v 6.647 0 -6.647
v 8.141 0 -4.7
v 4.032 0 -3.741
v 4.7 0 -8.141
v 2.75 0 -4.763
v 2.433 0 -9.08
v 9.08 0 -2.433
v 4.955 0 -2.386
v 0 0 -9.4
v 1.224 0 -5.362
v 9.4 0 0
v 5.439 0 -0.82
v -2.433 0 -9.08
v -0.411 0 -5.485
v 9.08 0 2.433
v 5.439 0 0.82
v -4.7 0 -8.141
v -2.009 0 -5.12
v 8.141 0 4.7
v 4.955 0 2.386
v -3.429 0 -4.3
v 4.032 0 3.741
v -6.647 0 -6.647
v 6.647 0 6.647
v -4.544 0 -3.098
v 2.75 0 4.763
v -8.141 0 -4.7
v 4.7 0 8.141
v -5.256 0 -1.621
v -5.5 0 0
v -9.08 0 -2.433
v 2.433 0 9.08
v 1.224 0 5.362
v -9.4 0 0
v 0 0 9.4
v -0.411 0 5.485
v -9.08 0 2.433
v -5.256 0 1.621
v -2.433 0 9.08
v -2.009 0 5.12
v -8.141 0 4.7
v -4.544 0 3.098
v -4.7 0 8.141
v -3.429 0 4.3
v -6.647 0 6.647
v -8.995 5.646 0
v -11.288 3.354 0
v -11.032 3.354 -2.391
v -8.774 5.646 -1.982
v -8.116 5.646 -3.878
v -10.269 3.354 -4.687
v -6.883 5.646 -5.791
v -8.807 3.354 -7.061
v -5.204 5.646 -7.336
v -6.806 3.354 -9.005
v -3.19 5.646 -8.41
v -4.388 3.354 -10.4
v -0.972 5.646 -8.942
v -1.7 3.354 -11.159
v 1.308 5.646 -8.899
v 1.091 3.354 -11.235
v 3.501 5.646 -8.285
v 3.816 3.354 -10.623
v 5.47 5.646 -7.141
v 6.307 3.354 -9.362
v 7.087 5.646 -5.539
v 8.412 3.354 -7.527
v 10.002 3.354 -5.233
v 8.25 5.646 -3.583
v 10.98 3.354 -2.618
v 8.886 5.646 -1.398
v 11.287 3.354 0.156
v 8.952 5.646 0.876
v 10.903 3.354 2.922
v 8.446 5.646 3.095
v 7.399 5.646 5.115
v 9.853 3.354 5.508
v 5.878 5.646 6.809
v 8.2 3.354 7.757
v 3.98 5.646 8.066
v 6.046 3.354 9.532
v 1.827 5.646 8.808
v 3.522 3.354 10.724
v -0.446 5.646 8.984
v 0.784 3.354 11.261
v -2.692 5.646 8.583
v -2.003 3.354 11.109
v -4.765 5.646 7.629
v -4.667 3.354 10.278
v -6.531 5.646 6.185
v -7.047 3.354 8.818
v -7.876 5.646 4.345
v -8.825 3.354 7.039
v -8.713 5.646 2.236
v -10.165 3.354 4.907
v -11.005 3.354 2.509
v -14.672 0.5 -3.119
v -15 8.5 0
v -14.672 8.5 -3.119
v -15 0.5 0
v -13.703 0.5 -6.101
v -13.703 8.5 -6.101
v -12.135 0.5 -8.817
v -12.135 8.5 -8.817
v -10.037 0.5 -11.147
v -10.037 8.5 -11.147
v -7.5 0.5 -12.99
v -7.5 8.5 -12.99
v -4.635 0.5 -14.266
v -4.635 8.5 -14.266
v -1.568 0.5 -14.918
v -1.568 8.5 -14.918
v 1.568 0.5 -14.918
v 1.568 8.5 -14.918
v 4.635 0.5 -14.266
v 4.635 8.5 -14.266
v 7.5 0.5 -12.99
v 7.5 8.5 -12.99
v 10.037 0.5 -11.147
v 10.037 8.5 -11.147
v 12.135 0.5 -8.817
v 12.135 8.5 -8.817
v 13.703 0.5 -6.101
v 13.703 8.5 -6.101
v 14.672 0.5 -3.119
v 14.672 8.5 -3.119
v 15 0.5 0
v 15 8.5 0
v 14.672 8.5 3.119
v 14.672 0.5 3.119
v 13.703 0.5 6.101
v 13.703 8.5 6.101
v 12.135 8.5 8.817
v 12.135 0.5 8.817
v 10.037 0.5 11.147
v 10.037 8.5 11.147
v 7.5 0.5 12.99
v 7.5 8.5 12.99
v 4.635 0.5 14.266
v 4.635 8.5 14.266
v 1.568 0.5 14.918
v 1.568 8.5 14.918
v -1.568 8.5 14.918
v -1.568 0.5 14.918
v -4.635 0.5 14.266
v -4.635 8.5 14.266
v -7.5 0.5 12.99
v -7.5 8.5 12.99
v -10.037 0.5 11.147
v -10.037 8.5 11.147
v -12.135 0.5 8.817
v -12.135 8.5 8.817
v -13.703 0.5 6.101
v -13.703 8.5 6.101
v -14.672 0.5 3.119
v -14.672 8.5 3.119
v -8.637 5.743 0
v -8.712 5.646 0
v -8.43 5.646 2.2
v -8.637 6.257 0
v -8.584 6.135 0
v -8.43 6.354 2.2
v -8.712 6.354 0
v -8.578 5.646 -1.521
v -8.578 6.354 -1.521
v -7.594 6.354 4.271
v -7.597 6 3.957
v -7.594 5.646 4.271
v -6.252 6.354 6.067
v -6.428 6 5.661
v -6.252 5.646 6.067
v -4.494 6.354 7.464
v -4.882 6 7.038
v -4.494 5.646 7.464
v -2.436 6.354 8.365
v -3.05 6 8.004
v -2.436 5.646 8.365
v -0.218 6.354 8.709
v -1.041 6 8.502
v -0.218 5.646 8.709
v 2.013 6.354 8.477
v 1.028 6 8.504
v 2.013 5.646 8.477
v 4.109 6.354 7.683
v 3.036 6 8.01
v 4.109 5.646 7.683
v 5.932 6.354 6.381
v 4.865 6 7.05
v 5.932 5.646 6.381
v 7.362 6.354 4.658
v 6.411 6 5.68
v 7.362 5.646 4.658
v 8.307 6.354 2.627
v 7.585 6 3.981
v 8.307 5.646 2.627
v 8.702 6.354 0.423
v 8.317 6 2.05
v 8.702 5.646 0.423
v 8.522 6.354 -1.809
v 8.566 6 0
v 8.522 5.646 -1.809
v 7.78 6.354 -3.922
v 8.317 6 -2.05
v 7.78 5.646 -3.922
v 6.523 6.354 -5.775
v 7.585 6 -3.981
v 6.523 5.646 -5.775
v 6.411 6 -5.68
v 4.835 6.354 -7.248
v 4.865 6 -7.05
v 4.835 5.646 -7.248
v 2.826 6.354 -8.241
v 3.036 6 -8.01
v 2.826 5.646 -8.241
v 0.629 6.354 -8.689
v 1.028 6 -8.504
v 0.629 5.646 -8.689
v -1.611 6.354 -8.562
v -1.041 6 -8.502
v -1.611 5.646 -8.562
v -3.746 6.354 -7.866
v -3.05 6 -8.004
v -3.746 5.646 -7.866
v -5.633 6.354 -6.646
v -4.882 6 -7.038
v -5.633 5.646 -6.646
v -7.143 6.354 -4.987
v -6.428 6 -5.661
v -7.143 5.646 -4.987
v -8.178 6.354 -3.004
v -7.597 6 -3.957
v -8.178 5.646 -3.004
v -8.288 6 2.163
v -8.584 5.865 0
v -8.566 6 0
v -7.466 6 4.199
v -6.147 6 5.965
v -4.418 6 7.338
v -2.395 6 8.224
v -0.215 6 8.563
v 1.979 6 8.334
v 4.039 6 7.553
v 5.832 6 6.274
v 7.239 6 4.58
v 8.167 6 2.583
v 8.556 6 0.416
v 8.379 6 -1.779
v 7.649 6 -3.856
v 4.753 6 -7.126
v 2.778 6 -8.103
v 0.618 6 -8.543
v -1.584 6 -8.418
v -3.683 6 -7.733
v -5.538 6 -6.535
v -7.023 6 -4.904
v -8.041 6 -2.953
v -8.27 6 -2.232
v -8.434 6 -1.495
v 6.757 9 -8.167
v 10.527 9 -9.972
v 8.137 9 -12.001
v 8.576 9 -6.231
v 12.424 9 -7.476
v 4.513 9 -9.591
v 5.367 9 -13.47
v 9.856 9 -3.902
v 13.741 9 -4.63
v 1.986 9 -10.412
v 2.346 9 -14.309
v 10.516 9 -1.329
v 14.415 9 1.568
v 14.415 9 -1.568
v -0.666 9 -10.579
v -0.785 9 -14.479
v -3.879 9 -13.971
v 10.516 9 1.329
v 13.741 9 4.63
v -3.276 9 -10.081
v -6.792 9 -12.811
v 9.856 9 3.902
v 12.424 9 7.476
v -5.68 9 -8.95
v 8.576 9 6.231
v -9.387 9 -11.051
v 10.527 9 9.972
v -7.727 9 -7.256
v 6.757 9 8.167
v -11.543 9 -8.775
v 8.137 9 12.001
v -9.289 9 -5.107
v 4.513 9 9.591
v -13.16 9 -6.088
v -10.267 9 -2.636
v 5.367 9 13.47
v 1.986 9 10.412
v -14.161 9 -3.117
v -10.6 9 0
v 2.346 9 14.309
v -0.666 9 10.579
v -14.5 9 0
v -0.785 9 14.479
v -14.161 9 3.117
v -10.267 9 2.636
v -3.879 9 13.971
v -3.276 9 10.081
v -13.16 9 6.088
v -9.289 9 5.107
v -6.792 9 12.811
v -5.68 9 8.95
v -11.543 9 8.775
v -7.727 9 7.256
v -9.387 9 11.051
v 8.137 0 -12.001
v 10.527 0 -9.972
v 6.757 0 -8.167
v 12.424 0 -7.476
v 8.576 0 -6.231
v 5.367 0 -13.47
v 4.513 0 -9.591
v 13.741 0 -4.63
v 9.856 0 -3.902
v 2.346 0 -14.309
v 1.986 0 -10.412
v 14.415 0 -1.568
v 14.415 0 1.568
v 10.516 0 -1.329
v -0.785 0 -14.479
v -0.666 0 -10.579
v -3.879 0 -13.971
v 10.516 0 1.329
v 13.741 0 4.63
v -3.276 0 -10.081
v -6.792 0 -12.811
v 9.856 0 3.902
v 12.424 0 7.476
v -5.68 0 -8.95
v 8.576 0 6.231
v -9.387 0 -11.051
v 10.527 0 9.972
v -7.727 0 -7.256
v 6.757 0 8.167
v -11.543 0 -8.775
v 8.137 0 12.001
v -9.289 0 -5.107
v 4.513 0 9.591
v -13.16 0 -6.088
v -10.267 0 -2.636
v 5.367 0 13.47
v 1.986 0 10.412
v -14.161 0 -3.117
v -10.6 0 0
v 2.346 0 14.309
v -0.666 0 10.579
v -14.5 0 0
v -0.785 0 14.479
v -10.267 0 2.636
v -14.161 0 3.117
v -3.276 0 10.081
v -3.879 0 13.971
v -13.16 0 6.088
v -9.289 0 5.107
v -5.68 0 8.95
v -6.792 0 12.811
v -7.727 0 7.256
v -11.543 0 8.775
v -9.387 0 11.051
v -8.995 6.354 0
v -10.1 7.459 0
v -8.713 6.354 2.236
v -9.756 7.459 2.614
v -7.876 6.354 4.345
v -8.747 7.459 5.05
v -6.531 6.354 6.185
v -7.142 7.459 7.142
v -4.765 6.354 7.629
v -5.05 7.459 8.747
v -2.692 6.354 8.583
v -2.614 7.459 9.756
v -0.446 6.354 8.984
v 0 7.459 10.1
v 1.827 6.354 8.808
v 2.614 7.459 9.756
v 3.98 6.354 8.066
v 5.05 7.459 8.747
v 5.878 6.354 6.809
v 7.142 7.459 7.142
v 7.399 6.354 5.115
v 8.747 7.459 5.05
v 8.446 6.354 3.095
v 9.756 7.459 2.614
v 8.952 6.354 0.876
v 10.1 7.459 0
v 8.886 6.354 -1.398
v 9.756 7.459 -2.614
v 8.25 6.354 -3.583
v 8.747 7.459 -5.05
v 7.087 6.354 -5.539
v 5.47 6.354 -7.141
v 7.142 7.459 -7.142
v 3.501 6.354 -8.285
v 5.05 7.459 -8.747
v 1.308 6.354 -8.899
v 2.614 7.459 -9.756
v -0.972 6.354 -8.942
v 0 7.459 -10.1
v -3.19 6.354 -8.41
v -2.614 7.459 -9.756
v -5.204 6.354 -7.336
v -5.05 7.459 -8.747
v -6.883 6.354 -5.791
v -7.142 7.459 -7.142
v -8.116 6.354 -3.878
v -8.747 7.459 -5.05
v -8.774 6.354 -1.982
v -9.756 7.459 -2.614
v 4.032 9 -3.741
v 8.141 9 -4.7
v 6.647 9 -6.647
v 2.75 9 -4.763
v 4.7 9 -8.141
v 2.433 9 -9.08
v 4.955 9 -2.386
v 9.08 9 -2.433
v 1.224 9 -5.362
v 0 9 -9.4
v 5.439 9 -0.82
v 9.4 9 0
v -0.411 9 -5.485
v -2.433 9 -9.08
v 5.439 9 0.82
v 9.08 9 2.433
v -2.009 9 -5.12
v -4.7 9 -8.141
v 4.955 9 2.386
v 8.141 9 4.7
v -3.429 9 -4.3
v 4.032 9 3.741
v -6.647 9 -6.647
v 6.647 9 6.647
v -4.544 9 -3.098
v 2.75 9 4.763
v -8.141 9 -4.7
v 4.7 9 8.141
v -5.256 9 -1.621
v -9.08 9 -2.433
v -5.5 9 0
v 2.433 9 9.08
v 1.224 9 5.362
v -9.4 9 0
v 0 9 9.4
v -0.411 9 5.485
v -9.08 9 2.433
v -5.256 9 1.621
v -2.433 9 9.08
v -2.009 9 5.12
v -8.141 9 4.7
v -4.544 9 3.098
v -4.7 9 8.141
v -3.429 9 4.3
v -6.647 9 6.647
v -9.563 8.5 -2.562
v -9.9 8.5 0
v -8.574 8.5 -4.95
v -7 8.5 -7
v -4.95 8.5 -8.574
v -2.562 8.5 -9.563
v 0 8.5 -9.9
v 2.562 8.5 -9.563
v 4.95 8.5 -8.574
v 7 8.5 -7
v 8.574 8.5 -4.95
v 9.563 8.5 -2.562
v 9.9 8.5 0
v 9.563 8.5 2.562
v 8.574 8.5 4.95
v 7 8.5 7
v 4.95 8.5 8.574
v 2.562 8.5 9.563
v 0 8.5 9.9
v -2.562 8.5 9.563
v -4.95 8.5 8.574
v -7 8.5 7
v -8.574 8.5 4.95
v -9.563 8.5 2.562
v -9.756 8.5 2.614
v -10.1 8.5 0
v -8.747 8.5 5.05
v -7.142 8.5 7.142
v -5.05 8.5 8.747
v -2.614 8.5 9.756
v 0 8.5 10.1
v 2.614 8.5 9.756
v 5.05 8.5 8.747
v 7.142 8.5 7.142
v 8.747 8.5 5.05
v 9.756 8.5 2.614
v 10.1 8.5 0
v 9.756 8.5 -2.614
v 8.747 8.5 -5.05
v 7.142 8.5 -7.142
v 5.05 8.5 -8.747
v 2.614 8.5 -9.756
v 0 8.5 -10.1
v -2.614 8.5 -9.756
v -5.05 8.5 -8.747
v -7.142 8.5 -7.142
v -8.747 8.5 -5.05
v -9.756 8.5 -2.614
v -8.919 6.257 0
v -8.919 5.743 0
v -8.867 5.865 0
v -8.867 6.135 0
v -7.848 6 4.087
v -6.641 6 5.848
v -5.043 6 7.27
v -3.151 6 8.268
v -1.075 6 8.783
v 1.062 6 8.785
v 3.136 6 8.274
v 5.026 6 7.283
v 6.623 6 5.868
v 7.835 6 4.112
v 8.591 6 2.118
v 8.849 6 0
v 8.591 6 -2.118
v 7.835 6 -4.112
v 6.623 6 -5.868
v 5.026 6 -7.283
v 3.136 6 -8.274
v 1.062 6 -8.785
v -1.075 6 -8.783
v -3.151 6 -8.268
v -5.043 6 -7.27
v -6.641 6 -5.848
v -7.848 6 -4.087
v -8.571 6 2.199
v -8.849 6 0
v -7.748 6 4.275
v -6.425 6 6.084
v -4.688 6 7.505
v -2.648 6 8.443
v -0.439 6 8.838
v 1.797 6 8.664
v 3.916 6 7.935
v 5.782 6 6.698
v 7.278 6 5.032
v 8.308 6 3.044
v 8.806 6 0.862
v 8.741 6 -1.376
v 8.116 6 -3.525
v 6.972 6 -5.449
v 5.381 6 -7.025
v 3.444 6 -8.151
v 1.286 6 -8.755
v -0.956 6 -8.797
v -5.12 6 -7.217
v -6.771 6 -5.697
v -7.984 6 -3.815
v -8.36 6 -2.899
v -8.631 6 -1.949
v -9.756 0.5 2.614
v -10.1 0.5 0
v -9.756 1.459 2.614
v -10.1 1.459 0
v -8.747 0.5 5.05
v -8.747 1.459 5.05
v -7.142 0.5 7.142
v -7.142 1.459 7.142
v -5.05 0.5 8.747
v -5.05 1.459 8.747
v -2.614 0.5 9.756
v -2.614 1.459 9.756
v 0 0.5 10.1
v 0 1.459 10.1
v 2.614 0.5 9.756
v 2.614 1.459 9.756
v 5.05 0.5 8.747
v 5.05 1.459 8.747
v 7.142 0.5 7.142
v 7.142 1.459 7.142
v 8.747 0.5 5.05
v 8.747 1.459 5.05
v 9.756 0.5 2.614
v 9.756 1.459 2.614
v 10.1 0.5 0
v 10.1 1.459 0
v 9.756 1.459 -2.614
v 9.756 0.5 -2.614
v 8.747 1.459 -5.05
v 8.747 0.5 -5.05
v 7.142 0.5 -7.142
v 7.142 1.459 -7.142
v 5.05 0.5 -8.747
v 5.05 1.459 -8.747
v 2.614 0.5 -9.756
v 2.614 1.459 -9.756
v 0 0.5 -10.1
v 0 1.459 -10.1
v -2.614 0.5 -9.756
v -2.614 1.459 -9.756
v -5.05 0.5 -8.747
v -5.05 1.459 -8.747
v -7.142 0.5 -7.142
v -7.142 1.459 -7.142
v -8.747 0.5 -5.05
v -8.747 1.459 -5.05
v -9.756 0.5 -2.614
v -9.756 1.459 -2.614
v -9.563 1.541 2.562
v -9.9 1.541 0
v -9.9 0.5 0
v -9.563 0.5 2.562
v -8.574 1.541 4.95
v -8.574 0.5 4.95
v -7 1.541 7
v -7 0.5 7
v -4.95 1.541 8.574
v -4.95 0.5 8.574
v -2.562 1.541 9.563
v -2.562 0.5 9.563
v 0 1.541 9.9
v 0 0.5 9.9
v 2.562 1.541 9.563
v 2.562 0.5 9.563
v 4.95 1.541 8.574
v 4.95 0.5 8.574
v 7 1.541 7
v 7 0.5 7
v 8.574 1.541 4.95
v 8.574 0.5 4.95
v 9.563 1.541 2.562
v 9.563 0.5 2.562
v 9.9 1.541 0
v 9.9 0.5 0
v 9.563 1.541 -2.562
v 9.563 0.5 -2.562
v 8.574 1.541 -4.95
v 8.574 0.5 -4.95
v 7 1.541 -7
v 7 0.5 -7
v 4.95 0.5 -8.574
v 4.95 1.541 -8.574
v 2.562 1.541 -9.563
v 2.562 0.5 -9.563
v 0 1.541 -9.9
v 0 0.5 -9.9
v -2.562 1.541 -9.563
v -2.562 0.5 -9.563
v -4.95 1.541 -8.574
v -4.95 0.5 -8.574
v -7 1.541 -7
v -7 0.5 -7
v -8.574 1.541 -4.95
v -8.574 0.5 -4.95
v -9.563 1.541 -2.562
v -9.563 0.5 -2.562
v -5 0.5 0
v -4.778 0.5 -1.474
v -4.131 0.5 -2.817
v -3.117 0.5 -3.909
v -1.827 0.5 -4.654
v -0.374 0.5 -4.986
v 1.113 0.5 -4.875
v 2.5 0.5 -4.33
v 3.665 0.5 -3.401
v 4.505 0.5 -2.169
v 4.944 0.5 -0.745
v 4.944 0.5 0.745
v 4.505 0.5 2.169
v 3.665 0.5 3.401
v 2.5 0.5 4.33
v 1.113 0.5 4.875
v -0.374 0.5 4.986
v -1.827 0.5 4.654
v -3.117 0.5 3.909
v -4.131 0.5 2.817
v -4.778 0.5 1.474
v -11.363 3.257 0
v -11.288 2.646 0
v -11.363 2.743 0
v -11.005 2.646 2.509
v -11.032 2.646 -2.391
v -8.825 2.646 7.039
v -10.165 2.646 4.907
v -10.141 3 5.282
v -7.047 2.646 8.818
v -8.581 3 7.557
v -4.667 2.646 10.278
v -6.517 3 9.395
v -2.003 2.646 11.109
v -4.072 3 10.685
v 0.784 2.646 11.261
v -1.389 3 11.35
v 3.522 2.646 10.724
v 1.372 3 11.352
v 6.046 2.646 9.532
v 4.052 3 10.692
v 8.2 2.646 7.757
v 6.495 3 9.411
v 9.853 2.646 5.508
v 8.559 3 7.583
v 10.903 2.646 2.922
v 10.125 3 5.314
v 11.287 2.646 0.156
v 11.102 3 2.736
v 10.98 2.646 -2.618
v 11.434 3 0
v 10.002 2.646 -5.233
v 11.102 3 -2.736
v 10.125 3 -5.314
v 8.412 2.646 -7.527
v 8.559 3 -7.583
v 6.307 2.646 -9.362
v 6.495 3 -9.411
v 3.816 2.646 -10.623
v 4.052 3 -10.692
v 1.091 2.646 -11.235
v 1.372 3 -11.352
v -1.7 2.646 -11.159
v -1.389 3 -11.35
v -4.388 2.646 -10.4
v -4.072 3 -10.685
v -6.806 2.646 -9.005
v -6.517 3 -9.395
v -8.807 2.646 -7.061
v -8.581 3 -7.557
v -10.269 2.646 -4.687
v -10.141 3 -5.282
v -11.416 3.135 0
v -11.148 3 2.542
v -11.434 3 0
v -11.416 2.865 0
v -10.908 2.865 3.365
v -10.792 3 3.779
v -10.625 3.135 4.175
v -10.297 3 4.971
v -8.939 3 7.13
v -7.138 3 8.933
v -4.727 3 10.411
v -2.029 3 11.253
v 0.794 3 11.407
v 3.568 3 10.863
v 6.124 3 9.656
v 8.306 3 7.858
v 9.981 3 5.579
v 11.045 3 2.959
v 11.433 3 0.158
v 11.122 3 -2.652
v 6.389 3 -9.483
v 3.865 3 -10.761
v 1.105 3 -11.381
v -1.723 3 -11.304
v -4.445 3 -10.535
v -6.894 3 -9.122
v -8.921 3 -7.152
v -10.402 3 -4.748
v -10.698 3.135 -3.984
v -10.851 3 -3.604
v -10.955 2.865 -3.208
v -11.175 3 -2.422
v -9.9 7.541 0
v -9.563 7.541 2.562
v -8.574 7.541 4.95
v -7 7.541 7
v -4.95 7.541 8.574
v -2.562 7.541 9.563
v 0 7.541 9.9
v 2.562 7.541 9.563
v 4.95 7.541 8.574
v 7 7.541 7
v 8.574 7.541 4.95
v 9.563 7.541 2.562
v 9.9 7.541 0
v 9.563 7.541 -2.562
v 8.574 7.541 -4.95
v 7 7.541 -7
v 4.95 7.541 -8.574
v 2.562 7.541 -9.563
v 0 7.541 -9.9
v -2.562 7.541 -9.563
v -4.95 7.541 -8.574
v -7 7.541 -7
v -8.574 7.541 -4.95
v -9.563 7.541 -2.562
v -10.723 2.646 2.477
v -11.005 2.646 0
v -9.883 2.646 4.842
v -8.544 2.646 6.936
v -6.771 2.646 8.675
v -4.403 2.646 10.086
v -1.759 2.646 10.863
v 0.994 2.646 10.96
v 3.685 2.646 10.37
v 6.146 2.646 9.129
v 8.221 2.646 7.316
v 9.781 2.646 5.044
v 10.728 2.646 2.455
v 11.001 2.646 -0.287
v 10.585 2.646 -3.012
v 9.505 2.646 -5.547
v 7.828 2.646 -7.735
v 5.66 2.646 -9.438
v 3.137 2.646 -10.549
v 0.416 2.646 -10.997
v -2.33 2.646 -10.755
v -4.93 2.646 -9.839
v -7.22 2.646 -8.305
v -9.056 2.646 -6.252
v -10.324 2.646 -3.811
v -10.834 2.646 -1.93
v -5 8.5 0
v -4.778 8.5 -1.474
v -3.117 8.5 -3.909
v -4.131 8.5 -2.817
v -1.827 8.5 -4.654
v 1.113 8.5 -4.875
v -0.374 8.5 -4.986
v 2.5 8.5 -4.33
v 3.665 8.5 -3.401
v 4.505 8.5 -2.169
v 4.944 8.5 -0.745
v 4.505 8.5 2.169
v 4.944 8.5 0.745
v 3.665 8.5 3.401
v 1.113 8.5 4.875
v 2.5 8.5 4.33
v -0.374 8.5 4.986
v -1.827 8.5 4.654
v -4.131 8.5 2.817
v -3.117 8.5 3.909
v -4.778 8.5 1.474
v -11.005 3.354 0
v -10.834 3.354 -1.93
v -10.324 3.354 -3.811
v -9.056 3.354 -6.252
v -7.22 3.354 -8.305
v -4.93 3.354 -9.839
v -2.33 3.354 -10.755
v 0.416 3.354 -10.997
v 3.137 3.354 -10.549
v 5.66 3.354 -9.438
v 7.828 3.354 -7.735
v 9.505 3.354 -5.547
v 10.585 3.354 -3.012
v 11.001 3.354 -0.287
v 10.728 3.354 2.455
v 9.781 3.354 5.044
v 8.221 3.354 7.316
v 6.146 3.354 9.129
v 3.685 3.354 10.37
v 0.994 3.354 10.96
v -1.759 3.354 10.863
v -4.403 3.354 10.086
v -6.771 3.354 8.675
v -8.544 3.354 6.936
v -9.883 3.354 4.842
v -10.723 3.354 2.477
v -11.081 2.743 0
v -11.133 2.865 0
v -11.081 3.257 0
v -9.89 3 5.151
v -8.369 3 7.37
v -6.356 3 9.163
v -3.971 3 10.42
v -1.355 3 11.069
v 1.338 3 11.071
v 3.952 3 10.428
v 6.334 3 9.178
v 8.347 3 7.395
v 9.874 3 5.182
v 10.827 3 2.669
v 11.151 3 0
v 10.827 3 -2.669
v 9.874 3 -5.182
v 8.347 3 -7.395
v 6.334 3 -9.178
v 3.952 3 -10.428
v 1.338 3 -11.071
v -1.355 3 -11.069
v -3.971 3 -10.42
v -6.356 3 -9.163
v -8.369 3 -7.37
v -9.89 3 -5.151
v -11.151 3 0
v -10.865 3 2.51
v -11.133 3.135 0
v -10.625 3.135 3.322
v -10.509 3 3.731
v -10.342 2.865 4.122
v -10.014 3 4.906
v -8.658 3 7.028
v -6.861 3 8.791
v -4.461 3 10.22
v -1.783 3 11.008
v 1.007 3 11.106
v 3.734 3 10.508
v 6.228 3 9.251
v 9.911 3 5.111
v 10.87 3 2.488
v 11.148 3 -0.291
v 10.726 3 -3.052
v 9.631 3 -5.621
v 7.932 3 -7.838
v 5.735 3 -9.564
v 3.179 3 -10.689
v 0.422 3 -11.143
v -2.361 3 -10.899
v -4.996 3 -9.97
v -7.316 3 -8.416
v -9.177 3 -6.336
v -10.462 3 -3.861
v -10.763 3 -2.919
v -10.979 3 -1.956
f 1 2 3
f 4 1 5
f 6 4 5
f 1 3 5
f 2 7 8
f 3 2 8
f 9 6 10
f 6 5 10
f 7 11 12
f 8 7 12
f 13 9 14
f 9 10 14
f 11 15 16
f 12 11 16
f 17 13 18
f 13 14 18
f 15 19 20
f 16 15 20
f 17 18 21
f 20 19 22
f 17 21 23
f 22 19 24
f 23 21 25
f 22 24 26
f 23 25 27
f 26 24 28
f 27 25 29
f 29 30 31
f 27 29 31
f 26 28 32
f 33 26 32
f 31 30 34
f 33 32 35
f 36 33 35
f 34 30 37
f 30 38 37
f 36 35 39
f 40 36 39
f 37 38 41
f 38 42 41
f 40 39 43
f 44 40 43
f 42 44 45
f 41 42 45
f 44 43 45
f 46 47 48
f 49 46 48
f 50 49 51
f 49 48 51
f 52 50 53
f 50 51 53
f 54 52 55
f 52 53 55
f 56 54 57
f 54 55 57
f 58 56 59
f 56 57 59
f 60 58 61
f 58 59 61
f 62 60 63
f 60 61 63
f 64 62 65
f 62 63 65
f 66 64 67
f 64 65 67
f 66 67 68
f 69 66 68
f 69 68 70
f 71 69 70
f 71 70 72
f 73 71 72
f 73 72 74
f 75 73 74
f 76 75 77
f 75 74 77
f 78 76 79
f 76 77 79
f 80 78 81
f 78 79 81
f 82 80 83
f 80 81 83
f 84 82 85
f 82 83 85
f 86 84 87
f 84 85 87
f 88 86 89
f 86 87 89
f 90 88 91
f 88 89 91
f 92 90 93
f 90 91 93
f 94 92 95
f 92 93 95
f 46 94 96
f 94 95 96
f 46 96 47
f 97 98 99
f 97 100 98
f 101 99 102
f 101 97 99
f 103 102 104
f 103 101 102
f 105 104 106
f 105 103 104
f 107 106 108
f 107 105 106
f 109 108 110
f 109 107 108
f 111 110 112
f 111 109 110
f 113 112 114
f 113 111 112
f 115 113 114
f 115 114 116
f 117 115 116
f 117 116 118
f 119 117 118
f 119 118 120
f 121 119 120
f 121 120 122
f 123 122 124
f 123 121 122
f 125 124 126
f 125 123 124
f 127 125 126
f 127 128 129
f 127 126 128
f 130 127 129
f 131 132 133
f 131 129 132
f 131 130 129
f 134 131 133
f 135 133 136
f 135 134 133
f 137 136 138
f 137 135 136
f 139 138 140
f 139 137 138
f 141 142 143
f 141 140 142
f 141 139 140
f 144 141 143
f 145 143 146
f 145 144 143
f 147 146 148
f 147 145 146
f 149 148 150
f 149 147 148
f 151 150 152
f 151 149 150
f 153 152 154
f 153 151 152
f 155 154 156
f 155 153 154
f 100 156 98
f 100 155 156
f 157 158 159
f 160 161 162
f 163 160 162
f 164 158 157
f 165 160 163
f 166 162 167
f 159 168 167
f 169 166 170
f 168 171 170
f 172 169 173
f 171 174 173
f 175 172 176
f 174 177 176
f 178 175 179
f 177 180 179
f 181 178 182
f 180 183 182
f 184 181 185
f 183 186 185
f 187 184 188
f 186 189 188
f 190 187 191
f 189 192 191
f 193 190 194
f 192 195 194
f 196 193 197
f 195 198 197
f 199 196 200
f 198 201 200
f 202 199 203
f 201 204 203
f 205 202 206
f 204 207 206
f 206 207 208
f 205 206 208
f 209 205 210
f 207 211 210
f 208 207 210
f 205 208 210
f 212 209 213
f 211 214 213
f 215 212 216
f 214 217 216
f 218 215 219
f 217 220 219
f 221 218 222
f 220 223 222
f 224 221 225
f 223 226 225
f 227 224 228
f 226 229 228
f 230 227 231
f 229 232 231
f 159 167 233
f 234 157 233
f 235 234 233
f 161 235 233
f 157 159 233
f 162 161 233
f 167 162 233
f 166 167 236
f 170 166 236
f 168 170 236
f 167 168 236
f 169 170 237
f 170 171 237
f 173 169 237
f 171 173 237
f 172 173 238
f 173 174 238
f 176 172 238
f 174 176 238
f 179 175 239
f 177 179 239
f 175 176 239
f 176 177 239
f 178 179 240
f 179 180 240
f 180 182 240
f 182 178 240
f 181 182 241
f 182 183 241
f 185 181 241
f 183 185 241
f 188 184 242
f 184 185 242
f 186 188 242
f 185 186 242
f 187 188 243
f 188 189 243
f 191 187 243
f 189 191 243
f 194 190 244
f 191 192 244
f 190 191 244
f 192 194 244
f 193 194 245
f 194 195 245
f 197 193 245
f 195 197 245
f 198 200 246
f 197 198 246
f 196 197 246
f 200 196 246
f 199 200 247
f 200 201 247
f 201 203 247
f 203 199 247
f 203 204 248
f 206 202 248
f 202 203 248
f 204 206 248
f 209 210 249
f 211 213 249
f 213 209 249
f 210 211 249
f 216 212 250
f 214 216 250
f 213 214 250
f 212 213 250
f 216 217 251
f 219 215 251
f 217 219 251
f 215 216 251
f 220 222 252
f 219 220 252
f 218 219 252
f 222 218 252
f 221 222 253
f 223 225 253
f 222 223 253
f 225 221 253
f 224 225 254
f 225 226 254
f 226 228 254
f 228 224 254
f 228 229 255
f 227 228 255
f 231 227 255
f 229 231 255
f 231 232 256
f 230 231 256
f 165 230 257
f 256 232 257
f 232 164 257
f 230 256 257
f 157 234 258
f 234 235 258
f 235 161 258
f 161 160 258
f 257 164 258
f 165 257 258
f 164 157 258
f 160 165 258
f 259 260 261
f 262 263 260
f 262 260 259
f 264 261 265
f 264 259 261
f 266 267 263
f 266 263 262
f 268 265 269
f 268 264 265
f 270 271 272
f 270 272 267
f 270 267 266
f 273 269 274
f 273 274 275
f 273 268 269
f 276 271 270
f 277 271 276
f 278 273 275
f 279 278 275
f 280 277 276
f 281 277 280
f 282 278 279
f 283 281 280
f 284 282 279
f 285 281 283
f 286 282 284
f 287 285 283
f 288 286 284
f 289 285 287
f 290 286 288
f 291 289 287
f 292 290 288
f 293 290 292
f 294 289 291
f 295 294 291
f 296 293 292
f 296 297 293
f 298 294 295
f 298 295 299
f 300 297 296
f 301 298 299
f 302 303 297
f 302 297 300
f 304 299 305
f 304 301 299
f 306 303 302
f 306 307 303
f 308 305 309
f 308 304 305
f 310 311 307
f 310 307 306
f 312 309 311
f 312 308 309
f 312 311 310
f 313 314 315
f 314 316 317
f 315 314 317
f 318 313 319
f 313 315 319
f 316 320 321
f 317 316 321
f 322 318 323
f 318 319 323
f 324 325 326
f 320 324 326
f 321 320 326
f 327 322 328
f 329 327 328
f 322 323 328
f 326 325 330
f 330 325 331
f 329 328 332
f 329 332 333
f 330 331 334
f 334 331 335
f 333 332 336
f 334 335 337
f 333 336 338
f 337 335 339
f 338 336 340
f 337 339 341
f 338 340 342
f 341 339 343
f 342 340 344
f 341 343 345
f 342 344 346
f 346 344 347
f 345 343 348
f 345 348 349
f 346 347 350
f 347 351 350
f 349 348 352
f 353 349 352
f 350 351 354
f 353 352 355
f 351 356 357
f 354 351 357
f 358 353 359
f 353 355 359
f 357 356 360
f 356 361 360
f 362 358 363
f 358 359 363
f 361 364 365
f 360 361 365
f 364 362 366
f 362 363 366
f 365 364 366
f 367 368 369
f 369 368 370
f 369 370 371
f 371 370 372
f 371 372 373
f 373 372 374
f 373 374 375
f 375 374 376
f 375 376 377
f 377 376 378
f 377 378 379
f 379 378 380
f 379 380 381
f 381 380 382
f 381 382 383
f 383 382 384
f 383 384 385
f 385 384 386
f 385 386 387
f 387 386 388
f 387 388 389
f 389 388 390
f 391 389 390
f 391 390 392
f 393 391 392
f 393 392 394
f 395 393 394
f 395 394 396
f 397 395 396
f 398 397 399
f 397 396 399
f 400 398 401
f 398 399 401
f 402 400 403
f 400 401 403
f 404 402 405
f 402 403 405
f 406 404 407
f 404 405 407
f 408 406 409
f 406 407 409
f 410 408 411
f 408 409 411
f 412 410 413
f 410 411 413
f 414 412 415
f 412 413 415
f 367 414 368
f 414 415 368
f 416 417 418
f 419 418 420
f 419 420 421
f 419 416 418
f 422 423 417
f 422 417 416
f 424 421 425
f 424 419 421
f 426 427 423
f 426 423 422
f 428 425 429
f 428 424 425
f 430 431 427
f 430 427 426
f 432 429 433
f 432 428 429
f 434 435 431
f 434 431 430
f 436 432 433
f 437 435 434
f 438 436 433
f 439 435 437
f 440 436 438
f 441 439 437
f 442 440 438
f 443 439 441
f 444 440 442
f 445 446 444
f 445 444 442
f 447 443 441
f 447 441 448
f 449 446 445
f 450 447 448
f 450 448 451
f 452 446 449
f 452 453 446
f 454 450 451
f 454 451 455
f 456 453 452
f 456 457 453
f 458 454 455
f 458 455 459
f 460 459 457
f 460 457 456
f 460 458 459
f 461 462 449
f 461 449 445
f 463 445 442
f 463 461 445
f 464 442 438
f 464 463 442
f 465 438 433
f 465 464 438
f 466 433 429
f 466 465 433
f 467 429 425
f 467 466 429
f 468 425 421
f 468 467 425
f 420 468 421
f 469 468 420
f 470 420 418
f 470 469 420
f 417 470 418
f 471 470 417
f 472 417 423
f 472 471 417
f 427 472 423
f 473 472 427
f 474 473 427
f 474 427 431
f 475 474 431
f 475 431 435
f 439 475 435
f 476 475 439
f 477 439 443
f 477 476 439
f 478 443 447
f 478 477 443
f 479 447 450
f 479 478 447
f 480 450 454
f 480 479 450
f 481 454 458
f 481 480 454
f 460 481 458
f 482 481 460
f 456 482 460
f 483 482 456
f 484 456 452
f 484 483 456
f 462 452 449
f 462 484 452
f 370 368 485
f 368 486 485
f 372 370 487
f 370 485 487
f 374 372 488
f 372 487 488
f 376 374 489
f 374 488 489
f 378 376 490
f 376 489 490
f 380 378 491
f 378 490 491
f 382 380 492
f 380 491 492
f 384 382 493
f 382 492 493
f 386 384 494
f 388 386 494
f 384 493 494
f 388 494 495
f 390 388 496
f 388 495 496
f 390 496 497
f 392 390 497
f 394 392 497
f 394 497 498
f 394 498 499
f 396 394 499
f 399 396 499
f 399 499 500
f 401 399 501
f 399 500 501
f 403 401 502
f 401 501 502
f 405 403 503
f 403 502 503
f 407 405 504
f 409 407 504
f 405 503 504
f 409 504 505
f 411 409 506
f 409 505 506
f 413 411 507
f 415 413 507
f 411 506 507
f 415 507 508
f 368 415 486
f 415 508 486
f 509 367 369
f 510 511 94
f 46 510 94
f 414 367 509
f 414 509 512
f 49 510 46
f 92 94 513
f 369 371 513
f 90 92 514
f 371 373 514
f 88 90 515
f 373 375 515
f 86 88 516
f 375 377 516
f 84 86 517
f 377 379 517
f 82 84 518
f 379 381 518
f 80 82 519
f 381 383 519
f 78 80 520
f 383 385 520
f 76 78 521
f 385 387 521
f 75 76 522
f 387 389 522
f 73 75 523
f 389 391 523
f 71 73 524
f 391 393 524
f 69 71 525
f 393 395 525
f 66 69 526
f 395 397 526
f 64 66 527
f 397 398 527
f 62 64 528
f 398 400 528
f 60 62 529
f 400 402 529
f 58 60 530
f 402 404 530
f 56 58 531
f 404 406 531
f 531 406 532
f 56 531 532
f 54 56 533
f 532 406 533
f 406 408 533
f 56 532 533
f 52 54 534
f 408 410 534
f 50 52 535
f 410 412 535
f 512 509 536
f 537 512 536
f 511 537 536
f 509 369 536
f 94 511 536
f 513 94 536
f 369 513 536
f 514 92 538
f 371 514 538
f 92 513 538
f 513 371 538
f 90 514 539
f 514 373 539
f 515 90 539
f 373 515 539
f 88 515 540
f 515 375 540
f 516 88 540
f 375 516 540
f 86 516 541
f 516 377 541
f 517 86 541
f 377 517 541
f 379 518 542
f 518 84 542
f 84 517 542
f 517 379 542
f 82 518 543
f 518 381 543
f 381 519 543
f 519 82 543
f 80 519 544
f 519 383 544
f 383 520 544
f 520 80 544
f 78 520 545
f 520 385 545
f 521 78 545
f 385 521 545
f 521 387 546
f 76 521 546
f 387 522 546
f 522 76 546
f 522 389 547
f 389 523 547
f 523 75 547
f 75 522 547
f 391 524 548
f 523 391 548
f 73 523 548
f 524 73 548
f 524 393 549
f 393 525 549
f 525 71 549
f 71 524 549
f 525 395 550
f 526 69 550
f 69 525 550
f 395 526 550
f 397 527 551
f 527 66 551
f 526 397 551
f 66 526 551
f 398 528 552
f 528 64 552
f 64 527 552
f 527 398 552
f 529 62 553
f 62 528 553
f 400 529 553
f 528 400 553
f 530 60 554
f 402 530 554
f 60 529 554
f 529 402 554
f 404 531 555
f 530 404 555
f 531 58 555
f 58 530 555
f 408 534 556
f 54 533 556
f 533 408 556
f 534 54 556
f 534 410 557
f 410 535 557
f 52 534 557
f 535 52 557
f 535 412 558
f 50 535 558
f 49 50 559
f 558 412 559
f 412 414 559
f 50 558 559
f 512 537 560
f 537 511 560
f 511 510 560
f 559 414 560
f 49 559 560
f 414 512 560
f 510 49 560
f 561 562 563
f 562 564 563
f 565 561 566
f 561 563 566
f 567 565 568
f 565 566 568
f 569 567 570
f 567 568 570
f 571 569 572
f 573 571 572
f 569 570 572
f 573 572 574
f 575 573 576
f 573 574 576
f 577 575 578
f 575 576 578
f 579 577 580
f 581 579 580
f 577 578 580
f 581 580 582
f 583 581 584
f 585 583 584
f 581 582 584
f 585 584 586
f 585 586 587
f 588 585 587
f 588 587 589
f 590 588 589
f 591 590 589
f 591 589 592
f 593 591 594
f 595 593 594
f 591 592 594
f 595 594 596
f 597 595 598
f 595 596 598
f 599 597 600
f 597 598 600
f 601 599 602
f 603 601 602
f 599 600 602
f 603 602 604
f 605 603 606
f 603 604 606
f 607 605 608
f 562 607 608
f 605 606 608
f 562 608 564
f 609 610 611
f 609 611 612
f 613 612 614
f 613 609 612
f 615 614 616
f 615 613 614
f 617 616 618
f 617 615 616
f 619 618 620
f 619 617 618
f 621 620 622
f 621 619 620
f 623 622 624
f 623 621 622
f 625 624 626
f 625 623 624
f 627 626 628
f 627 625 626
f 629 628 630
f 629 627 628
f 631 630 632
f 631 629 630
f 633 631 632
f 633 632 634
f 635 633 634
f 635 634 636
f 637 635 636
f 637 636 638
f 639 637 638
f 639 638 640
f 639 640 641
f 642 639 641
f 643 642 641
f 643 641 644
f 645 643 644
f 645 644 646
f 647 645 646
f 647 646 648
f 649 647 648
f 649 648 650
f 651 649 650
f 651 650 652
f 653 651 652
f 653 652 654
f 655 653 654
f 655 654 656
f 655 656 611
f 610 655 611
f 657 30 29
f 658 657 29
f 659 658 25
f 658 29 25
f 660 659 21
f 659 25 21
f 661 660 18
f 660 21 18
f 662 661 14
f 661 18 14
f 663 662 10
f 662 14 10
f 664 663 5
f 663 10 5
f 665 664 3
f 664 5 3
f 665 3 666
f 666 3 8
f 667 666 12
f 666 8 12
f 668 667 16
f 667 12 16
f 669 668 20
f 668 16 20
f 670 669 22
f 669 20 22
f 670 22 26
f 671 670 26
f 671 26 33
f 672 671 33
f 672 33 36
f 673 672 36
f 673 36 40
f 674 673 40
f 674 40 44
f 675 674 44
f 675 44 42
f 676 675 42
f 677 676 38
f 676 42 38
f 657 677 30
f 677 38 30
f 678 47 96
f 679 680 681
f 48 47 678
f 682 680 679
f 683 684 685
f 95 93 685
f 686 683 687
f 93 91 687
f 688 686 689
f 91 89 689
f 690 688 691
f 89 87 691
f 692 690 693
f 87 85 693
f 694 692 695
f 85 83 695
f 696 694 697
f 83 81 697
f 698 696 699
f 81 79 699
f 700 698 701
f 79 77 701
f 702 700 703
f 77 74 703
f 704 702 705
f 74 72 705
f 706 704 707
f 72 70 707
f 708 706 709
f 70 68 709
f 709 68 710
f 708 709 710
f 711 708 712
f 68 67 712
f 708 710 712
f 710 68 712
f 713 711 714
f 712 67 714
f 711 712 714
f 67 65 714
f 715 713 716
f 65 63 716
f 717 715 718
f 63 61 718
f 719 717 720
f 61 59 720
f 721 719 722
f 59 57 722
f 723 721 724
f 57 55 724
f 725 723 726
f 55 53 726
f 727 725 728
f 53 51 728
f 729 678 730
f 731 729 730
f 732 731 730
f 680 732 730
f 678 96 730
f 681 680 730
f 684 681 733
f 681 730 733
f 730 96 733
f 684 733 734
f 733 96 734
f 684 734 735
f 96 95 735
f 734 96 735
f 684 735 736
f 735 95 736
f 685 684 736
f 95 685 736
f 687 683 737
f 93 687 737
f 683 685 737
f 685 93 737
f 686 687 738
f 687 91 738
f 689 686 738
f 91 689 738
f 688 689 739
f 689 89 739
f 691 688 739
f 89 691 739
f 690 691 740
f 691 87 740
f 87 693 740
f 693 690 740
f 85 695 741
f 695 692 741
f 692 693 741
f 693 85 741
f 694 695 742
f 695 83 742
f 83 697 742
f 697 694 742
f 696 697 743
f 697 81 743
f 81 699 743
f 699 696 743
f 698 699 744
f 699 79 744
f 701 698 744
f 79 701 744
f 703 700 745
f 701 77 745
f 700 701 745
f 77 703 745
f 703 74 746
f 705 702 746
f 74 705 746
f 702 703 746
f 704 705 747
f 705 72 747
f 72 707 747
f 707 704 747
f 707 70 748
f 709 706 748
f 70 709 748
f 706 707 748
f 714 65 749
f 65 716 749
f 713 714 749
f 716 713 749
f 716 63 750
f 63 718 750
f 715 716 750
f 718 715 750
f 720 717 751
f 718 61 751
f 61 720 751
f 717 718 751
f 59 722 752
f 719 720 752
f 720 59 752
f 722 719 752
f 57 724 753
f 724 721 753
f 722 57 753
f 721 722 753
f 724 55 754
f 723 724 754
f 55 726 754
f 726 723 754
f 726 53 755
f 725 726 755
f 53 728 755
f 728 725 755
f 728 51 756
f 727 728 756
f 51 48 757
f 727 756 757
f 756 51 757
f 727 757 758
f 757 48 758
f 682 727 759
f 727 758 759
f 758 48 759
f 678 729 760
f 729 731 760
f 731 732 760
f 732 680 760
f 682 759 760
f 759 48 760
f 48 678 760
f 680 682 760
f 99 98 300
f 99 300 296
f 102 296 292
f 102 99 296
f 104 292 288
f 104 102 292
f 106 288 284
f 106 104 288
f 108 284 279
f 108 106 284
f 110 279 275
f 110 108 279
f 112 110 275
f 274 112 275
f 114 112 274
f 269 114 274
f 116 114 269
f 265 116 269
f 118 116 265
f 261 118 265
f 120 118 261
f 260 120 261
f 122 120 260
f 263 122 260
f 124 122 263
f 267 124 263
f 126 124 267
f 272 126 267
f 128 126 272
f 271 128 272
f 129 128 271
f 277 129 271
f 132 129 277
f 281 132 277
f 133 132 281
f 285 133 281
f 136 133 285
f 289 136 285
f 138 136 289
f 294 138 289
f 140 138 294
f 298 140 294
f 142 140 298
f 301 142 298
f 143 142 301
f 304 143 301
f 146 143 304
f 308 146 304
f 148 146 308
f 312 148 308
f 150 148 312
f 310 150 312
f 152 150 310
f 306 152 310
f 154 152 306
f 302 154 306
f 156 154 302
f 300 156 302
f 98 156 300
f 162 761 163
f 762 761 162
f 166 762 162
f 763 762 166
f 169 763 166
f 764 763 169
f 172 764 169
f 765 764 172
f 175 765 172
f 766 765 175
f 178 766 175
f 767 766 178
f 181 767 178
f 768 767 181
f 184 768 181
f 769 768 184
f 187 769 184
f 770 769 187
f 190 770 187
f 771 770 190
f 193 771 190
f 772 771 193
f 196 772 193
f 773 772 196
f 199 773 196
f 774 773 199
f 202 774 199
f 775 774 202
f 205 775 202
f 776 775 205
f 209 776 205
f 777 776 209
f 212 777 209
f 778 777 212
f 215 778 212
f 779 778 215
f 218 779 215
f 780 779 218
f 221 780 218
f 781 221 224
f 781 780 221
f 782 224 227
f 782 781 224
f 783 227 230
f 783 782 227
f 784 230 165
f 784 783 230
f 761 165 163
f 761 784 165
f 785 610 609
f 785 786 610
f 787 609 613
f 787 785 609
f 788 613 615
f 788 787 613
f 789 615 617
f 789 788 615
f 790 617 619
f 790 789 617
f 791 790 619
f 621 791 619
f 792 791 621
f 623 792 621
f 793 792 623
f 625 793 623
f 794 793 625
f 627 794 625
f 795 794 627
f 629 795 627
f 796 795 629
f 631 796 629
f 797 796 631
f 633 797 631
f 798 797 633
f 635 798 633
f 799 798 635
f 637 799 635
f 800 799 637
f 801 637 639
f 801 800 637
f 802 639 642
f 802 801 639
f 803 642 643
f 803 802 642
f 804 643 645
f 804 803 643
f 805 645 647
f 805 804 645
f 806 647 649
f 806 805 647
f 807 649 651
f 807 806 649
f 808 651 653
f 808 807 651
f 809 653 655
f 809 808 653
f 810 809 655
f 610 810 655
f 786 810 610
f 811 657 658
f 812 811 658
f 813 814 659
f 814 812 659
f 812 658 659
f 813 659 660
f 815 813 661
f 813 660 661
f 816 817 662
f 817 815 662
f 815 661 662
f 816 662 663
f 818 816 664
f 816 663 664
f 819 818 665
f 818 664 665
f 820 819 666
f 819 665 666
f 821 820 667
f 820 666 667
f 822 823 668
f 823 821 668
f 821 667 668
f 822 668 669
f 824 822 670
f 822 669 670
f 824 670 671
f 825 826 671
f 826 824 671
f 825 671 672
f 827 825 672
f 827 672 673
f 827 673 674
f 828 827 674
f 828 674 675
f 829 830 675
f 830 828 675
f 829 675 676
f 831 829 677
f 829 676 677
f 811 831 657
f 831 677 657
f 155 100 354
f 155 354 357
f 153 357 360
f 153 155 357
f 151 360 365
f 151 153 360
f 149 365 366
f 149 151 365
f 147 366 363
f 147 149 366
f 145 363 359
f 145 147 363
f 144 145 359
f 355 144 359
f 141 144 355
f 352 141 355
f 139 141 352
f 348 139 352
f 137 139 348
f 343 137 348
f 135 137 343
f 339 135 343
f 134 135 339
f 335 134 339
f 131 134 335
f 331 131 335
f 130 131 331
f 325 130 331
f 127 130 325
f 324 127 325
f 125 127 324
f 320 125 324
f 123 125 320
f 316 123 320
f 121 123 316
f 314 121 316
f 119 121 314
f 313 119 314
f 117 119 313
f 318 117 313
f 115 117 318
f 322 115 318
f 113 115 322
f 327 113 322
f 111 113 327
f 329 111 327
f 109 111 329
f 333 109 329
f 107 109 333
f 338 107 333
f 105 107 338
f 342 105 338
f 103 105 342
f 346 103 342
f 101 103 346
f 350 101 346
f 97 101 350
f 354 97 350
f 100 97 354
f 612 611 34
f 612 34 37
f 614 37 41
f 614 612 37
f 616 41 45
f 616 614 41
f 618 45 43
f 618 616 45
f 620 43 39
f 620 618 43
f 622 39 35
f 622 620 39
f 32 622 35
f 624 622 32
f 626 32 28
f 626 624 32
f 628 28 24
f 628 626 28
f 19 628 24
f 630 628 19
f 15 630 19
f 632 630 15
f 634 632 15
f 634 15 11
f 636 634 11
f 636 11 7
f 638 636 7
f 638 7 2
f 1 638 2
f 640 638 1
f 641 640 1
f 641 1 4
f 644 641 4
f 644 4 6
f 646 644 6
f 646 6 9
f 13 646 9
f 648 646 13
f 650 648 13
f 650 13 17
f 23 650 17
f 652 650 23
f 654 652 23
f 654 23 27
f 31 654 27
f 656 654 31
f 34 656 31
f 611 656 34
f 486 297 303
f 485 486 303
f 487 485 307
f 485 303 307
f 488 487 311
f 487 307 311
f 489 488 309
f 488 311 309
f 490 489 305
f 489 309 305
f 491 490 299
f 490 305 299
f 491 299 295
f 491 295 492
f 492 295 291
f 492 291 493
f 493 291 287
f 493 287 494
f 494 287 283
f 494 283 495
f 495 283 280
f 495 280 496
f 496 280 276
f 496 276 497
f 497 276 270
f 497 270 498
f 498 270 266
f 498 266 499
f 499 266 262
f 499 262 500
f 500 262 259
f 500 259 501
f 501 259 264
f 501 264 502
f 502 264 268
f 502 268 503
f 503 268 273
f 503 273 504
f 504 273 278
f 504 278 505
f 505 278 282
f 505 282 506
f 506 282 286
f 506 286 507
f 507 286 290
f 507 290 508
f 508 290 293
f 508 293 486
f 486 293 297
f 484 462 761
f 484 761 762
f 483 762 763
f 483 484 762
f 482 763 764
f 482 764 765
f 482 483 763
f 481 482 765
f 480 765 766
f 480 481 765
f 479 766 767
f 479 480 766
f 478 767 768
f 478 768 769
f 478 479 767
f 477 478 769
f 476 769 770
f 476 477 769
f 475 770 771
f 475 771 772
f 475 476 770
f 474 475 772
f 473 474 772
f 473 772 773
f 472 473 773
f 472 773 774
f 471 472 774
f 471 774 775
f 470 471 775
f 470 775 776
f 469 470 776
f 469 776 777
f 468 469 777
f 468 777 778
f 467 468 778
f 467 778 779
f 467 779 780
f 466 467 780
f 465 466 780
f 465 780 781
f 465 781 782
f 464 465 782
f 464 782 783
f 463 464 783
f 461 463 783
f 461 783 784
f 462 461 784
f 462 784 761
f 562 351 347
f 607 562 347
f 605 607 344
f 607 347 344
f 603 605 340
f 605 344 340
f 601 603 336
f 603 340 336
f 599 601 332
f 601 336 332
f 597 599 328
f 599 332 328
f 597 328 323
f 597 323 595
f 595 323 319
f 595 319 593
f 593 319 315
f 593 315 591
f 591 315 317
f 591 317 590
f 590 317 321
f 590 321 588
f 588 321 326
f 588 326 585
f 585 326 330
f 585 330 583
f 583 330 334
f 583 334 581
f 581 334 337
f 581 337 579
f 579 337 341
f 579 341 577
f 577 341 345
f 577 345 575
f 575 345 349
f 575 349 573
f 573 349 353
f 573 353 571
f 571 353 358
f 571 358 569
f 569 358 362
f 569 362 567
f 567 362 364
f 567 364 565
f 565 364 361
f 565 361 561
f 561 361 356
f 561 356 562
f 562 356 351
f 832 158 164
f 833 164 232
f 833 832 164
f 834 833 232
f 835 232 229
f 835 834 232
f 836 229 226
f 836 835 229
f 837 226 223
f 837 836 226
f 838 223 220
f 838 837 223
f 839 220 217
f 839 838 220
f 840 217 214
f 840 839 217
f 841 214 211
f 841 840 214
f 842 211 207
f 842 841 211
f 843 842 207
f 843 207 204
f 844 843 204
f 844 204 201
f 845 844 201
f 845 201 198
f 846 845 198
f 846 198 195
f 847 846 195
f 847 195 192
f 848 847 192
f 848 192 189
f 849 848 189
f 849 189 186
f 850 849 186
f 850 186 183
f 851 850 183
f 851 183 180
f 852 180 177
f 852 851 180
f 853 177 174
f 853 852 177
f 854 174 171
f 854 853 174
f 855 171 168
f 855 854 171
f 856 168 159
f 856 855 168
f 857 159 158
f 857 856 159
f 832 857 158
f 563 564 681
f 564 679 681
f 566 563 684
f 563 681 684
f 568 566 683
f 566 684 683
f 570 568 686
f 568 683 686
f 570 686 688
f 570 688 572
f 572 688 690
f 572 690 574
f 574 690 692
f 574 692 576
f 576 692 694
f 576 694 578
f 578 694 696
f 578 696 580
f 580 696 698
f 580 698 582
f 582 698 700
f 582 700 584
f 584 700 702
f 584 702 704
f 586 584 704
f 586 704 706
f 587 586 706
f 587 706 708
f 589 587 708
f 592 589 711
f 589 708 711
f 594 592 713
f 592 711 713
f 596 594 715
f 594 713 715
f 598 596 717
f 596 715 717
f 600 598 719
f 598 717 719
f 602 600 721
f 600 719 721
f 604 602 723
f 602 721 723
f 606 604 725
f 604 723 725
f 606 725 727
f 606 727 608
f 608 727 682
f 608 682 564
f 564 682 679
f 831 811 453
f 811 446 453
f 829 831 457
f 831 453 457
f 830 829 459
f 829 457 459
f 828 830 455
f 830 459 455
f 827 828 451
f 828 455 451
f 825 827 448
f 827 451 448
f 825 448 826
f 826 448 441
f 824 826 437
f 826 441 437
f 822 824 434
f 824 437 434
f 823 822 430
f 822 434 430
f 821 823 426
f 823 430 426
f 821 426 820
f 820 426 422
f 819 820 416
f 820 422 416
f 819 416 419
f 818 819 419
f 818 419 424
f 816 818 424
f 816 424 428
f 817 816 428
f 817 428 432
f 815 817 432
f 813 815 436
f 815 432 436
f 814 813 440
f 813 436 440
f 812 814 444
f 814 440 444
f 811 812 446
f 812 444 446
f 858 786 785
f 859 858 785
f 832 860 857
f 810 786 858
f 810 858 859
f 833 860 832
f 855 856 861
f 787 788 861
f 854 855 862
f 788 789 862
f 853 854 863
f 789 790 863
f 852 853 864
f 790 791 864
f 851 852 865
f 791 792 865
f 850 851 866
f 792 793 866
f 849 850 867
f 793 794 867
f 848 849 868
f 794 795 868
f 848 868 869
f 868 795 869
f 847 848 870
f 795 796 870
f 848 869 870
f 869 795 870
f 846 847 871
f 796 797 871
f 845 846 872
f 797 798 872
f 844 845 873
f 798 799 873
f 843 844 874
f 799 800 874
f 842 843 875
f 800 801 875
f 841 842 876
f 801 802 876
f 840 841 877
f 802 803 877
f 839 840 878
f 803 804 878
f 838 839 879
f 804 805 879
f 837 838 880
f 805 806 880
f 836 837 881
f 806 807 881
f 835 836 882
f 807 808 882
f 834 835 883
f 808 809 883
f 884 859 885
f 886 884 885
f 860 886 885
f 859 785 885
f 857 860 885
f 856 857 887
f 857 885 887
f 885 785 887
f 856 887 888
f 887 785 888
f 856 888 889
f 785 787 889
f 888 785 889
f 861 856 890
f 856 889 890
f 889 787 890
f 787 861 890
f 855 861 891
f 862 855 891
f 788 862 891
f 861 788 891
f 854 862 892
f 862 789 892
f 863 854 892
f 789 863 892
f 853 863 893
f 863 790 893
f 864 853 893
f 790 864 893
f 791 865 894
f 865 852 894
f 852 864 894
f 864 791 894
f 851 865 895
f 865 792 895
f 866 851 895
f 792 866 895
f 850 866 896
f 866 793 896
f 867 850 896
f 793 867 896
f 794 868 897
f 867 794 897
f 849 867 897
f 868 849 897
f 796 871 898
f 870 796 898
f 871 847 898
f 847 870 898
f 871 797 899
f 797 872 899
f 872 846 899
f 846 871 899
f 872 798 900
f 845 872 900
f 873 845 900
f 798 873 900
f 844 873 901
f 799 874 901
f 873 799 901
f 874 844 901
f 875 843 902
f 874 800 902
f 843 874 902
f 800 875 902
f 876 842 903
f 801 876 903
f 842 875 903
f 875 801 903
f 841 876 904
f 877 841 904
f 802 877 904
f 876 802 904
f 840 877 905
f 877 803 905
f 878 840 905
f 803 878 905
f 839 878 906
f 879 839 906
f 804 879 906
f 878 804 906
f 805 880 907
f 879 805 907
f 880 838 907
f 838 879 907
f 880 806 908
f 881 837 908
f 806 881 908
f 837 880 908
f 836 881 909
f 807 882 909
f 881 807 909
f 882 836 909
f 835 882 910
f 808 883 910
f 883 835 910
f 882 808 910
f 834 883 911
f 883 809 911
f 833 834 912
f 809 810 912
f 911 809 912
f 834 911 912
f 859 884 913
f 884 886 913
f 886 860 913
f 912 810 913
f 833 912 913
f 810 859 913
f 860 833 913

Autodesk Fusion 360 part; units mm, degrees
sketch "profile" plane through (0, 0, 0) normal (0, 0, 1) x (1, 0, 0) in component "LR2051-821"
  line L0 (0, 0) -> (0, 9) construction
  line L1 (-5, 9) -> (-15, 9)
  line L2 (-15, 9) -> (-15, 0)
  line L3 (-15, 0) -> (-5, 0)
  line L4 (-5, 9) -> (-5, 0)
  line L5 (0, 9) -> (-5, 9) construction
  line L6 (-5, 0) -> (0, 0) construction
  line L7 (-10, 0) -> (-10, 1.5) construction
  line L8 (-10, 1.5) -> (-11.5, 3) construction
  line L9 (-11.5, 3) -> (-8.5, 6) construction
  line L10 (-8.5, 6) -> (-10, 7.5) construction
  line L11 (-10, 7.5) -> (-10, 9) construction
  line L12 (-5, 4.5) -> (-15, 4.5) construction
  line L13 (-10, 7.5) -> (-10, 1.5) construction
  line L14 (-9.9, 0) -> (-9.9, 1.5414)
  line L15 (-9.9, 1.5414) -> (-11.3586, 3)
  line L16 (-11.3586, 3) -> (-8.3586, 6)
  line L17 (-8.3586, 6) -> (-9.9, 7.5414)
  line L18 (-9.9, 7.5414) -> (-9.9, 9)
  line L19 (-10.1, 0) -> (-10.1, 1.4586)
  line L20 (-10.1, 1.4586) -> (-11.6414, 3)
  line L21 (-11.6414, 3) -> (-8.6414, 6)
  line L22 (-8.6414, 6) -> (-10.1, 7.4586)
  line L23 (-10.1, 7.4586) -> (-10.1, 9)
  point P0 (-10, 4.5)
  dimension "d4" = 15
  dimension "d5" = 5
  dimension "d6" = 45
  dimension "d7" = 1.5
  dimension "d8" = 1.5
  dimension "d9" = 9
  dimension "d10" = 0.1
  dimension "d11" = -0.1
revolve "Revolve1" add sketch "profile" angle 360 about axis through (0, 0, 0) along (0, 1, 0) contours L1 L3 L4 L14 L15 L16 L17 L18 makes body 1 in component "Inner Shell"
revolve "Revolve1'" add sketch "profile" angle 360 about axis through (0, 0, 0) along (0, 1, 0) separate body contours L1 L2 L3 L19 L20 L21 L22 L23 makes body 2 in component "Outer Shell"
chamfer "Chamfer1" distance 0.5 angle 45 2 edges at (-9.23, 9, 3.58) (-9.23, 0, 3.58) on bodies 1 in component "Inner Shell"
chamfer "Chamfer2" distance 0.5 angle 45 2 edges at (-4.6616, 9, 1.8081) (-4.6616, 0, 1.8081) on bodies 1 in component "Inner Shell"
chamfer "Chamfer1'" distance 0.5 angle 45 2 edges at (-9.4165, 9, 3.6523) (-9.4165, 0, 3.6523) on bodies 2 in component "Outer Shell"
chamfer "Chamfer2'" distance 0.5 angle 45 2 edges at (-13.9849, 9, 5.4242) (-13.9849, 0, 5.4242) on bodies 2 in component "Outer Shell"
fillet "Fillet1" radius 0.5 2 edges at (-7.7929, 6, 3.0226) (-10.5899, 3, 4.1074) on bodies 1 in component "Inner Shell"
fillet "Fillet1'" radius 0.5 2 edges at (-8.0566, 6, 3.1249) (-10.8536, 3, 4.2097) on bodies 2 in component "Outer Shell"
component "LR2051-821" placed x (1, 0, 0) y (0, 1, 0) z (0, 0, 1) at (0, 0, 0)
component "Inner Shell" placed x (1, 0, 0) y (0, 1, 0) z (0, 0, 1) at (0, 0, 0) in component "LR2051-821"
component "Outer Shell" placed x (1, 0, 0) y (0, 1, 0) z (0, 0, 1) at (0, 0, 0) in component "LR2051-821"
equation "inner_dia = 10 mm"
equation "outer_dia = 30 mm"
equation "width = 9 mm"
equation "d4 = outer_dia / 2"
equation "d5 = inner_dia / 2"
equation "d8 = d7"
equation "d9 = width"
equation "d10 = gap / 2"
equation "d11 = -gap / 2"
equation "gap = 0.2 mm"
equation "outer_chamfer = 0.5 mm"
equation "inner_chamfer = 0.5 mm"
equation "d17 = inner_chamfer"
equation "d18 = outer_chamfer"
equation "d19 = inner_chamfer"
equation "d20 = outer_chamfer"
